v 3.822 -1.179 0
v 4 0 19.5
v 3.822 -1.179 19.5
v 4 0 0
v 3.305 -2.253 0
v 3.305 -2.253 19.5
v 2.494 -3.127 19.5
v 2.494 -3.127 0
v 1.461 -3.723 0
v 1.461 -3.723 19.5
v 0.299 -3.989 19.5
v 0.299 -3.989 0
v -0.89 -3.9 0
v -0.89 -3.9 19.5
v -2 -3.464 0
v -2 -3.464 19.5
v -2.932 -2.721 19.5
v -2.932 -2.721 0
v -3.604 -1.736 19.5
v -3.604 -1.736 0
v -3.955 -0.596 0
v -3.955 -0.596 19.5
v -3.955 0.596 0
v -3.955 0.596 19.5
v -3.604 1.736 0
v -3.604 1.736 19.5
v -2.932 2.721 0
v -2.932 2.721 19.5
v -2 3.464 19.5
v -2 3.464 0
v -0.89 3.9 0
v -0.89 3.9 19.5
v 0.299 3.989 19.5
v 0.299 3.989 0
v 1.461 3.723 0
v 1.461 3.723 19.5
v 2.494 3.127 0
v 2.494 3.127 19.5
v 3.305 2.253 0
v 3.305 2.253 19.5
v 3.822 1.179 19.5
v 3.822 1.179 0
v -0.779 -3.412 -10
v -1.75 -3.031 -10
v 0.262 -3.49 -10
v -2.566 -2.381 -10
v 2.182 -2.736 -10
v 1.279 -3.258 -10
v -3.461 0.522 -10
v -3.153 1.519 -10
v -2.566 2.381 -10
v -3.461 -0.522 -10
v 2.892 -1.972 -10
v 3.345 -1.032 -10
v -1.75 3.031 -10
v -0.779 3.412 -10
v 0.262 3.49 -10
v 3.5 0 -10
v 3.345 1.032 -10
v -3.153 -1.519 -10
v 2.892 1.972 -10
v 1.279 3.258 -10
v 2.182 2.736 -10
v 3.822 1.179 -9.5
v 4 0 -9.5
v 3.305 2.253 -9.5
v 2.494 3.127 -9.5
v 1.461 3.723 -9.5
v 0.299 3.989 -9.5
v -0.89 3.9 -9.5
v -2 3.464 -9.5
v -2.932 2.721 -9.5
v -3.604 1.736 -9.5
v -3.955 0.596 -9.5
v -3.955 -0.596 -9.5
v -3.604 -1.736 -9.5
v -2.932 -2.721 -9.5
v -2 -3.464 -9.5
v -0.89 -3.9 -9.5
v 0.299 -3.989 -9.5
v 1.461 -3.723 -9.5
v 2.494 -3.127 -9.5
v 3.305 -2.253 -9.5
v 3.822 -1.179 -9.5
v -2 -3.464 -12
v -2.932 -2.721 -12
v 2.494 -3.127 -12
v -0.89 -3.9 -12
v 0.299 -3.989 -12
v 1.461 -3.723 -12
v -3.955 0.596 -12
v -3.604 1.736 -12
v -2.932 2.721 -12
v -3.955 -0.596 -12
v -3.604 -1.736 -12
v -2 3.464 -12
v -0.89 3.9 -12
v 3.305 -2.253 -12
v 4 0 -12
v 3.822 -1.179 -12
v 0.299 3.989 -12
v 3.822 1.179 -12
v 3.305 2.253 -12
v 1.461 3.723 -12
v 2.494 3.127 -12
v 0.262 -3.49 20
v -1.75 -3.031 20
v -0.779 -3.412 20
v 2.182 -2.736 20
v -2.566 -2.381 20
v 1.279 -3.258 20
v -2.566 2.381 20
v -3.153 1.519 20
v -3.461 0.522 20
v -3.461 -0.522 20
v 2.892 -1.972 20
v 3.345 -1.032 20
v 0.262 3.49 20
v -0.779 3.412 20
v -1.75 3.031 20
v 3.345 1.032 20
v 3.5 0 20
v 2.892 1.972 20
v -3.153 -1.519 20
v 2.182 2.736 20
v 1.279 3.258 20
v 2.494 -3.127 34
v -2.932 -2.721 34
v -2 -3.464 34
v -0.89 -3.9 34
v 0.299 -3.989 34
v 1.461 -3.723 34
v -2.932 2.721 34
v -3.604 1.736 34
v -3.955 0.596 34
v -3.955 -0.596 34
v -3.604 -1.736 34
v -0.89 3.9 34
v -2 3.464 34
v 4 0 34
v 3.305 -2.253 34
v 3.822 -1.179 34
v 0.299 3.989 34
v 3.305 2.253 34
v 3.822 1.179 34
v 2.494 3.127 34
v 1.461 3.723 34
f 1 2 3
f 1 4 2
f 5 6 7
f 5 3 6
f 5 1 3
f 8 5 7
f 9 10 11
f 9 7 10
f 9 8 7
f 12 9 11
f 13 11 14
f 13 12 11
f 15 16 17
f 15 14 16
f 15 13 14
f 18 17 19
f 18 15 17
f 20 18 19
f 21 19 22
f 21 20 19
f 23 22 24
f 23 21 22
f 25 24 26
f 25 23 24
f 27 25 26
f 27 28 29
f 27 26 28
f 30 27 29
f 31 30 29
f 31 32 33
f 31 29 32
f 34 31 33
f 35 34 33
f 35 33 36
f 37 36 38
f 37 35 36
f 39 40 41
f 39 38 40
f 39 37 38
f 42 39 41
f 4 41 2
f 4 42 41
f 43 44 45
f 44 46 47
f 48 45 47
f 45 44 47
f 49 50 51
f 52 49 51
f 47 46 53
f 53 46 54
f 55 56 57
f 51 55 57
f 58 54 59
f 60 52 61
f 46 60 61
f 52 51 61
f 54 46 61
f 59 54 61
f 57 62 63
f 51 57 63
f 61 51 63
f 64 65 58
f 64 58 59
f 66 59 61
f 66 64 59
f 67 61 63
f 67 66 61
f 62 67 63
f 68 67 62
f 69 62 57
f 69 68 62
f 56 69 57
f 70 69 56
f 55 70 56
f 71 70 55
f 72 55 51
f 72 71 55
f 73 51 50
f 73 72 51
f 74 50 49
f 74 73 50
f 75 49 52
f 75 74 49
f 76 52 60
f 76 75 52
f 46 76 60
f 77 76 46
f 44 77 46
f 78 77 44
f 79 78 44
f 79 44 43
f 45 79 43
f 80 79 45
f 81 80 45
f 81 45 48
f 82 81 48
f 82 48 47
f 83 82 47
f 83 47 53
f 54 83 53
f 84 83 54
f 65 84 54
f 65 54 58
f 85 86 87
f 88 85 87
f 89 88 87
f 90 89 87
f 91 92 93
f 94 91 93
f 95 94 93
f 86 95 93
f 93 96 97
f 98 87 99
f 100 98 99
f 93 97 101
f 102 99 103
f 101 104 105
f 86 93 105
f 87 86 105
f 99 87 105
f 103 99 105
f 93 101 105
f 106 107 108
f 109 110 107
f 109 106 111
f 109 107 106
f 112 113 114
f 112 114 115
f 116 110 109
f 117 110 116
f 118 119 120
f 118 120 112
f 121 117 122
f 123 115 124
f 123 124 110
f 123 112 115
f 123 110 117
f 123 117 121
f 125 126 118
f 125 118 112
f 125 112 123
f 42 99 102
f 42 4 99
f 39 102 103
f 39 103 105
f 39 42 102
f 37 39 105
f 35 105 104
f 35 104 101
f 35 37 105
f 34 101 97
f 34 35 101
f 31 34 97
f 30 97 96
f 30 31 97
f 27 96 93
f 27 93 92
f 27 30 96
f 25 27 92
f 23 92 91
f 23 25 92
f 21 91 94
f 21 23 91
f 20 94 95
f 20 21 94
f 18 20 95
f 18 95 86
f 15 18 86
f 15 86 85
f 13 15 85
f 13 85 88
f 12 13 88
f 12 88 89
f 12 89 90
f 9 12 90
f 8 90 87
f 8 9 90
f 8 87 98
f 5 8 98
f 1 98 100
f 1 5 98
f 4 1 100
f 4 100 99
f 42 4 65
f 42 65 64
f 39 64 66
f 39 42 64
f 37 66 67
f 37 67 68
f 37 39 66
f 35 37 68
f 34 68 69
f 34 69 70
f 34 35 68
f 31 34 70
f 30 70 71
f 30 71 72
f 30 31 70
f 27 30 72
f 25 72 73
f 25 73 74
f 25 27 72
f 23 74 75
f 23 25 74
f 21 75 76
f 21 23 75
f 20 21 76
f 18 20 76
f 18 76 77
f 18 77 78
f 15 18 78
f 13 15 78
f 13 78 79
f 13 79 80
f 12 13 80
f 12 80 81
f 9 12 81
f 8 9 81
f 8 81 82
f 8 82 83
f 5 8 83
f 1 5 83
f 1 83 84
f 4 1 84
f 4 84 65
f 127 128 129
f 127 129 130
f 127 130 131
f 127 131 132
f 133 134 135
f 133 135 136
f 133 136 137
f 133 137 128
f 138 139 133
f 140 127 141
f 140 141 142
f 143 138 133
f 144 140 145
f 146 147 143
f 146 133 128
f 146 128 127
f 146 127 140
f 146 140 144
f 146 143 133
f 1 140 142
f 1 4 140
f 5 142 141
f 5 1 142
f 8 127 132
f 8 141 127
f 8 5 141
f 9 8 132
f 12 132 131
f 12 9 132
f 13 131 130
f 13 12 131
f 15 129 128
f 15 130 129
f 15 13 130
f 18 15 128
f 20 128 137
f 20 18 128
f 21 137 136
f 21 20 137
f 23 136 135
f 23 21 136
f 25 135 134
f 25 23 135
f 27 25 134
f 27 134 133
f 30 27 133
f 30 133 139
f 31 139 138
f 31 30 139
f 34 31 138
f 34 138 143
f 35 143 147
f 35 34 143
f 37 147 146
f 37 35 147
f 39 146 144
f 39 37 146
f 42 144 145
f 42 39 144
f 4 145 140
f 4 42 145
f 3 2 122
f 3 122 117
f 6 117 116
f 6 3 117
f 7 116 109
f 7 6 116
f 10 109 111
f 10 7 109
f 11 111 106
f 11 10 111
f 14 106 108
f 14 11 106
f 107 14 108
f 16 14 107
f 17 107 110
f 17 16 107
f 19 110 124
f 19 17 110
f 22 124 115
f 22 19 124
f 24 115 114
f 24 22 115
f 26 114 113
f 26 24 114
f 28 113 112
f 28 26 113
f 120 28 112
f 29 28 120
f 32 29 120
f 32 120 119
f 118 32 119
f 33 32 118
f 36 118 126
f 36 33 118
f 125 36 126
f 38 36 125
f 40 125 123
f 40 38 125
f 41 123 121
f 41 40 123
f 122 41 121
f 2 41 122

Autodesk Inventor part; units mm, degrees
ref_plane "YZ Plane" through (0, 0, 0) normal (1, 0, 0) x (0, 1, 0)
ref_plane "XZ Plane" through (0, 0, 0) normal (0, 1, 0) x (-1, 0, 0)
ref_plane "XY Plane" through (0, 0, 0) normal (0, 0, 1) x (1, 0, 0)
sketch "Sketch1" plane through (0, 0, 0) normal (0, 0, 1) x (1, 0, 0)
  circle A0 centre (0, 0) radius 4
  dimension "D" = 8
extrude "Extrusion1" add sketch "Sketch1" along normal blind 20 and the other way blind 10
chamfer "Chamfer1" distance 0.5 angle 45 2 edges at (-4, 0, 20) (-4, 0, -10)
sketch "Sketch2" plane through (0, 0, 0) normal (0, 0, 1) x (1, 0, 0)
  circle A0 centre (0, 0) radius 4
  dimension "d8" = 8
extrude "Extrusion2" add sketch "Sketch2" along normal blind 34 and the other way blind 12 separate body
properties part number "Dowel 30x8" material "TMB 01"
